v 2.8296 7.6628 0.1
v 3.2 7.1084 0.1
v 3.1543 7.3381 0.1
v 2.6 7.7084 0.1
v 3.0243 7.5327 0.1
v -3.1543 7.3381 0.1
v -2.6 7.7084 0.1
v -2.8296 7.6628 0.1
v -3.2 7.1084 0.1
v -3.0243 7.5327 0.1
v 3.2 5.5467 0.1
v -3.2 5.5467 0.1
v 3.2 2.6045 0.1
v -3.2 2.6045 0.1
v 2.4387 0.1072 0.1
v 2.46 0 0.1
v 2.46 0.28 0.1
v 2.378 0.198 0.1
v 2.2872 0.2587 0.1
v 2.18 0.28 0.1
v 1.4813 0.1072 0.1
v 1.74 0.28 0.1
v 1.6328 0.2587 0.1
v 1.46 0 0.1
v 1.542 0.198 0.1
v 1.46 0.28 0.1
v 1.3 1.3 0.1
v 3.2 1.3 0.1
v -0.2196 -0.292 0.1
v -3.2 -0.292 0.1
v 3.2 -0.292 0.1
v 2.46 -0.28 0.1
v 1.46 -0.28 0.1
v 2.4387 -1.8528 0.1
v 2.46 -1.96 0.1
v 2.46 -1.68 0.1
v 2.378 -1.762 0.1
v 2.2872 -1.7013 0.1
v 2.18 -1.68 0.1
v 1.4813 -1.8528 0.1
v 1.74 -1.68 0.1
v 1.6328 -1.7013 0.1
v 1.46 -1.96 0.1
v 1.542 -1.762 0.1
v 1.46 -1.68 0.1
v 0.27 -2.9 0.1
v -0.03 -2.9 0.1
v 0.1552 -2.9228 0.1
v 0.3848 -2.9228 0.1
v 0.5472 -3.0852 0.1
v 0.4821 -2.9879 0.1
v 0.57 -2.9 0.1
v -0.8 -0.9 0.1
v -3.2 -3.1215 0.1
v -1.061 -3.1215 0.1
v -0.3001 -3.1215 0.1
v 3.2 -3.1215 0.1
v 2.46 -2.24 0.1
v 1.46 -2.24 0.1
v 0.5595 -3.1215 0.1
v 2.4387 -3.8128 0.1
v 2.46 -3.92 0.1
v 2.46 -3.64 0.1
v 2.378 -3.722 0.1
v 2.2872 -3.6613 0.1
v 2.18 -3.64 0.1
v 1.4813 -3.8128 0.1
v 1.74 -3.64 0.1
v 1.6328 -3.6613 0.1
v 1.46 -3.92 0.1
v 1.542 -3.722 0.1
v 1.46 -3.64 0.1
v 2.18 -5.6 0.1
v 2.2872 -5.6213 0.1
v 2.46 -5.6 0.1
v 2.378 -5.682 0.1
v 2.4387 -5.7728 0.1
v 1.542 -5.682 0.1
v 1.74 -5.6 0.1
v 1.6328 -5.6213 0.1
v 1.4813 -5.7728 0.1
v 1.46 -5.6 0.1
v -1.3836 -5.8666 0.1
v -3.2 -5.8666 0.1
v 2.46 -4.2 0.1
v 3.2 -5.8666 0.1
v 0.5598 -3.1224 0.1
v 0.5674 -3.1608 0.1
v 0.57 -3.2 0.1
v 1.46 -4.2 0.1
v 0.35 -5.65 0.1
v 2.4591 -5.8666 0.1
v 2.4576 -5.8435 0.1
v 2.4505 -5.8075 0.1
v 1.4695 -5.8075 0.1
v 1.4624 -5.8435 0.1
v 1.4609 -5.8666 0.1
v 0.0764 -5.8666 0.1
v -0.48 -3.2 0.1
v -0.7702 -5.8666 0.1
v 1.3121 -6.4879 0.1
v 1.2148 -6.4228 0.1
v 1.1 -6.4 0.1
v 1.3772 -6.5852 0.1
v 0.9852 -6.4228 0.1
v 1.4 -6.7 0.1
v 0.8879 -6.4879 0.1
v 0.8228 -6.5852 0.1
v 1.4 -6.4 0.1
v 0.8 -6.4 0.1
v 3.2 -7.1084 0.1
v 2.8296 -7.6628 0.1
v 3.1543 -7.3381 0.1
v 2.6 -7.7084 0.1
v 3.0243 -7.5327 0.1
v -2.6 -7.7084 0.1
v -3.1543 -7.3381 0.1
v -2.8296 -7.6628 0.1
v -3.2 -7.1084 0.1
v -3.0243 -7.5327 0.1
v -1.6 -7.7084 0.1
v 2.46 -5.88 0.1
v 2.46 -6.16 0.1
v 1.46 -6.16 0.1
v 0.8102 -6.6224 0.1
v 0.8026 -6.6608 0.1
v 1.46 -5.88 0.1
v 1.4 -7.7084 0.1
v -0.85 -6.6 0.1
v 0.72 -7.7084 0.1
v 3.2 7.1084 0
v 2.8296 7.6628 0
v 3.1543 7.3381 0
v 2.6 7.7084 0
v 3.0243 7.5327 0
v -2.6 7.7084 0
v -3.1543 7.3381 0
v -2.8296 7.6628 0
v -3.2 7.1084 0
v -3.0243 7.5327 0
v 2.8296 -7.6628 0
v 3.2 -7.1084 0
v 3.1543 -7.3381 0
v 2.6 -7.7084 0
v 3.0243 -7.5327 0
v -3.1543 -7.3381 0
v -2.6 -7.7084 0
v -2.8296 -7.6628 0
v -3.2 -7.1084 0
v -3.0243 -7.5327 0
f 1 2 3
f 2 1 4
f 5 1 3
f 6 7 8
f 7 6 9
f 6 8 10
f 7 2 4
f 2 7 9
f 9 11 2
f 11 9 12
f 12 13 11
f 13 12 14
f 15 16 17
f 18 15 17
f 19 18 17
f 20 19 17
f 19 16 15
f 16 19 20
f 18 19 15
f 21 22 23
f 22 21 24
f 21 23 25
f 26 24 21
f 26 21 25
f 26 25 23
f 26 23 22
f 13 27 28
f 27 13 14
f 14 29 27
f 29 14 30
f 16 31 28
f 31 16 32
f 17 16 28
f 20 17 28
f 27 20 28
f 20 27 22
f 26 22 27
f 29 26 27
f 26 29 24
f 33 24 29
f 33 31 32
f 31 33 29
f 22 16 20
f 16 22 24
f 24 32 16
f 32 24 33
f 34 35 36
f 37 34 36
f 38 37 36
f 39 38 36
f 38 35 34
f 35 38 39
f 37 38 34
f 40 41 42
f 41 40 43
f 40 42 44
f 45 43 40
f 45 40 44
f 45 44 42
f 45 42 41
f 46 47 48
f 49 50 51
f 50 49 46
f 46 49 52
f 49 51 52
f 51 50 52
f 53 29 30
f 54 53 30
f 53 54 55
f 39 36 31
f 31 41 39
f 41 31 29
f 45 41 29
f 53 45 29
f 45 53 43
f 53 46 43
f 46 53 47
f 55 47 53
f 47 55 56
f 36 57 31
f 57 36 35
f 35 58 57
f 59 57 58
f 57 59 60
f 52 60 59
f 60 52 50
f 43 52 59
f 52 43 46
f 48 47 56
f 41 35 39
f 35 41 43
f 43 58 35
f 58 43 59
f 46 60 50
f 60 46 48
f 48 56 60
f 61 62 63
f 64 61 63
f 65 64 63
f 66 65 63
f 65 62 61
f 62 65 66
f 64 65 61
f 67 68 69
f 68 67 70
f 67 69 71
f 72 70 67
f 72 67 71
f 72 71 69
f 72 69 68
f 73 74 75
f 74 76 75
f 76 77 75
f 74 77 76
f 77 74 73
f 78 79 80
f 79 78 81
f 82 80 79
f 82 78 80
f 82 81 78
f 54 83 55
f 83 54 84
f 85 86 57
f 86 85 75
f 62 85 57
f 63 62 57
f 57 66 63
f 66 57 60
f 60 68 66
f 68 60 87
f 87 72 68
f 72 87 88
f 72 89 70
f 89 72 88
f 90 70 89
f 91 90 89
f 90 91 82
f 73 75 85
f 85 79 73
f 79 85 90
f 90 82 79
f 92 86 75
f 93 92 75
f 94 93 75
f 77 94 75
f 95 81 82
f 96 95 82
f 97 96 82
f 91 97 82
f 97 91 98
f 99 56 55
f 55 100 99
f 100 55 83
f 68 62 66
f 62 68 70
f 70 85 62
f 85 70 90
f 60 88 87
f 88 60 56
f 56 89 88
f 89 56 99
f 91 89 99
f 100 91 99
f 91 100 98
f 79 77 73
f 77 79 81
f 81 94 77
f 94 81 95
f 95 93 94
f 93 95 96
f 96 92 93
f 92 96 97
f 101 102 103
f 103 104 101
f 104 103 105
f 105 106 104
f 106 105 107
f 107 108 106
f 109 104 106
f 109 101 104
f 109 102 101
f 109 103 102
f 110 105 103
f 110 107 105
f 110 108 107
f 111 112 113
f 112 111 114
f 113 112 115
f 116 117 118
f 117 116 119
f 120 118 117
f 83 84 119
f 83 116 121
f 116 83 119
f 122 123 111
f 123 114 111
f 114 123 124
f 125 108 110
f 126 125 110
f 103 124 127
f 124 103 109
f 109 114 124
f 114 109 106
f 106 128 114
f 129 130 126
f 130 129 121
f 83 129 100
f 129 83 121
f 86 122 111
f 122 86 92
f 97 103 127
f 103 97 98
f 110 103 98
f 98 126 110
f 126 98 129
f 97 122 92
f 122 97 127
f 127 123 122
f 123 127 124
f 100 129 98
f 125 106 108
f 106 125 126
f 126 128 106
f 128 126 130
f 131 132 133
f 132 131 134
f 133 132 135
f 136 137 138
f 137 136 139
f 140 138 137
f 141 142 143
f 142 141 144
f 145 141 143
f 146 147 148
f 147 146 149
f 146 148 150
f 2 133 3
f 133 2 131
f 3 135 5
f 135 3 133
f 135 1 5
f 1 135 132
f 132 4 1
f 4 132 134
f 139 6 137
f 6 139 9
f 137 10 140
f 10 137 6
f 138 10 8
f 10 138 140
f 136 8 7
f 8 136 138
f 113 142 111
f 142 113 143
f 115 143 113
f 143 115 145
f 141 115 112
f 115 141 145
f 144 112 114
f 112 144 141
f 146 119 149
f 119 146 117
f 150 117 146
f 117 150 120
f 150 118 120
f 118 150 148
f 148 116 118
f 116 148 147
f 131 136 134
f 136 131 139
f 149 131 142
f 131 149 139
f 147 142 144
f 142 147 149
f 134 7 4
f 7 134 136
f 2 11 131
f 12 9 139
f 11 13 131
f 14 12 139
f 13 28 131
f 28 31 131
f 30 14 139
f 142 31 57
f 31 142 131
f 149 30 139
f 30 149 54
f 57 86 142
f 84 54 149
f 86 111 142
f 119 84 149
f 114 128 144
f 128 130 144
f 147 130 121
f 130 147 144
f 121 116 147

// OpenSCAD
// file: ../p/empty.scad
use <../lib.scad>
function ldraw_lib__empty() = [
// 0 Empty
// 0 Name: empty.dat
// 0 Author: Steffen [Steffen]
// 0 !LDRAW_ORG Primitive UPDATE 2015-01
// 0 !LICENSE Licensed under CC BY 2.0 and CC BY 4.0 : see CAreadme.txt
// 
// 0 BFC CERTIFY CCW
  [0,"BFC","CERTIFY"],
  [0,"BFC","CCW"],
// 
// 0 !HISTORY 2015-10-11 [PTadmin] Official Update 2015-01
// 
// 
// 0 // Tool MLCad cannot handle really empty files. This file is used as a workaround.
// 0 // It exceptionally contains forbidden non-LDRAW standard syntax to satisfy MLCad until it is fixed OR a different editor has become the de-facto LDRAW standard.
// 0 // The line being used here is an "impossible" conditional line which never should be visible,
// 0 // additionally hidden by a syntax explicitly hiding it from displaying.
// 
// 0 MLCAD HIDE 5 24 0 0 0 0.0001 0 0 0.0001 -0.0001 0 0 0 0
];
makepoly(ldraw_lib__empty(), line=0.2);
// file: ../p/1-4cyli.scad
use <../lib.scad>
function ldraw_lib__1_4cyli() = [
// 0 Cylinder 0.25
// 0 Name: 1-4cyli.dat
// 0 Author: James Jessiman
// 0 !LDRAW_ORG Primitive UPDATE 2012-01
// 0 !LICENSE Licensed under CC BY 2.0 and CC BY 4.0 : see CAreadme.txt
// 
// 0 BFC CERTIFY CCW
  [0,"BFC","CERTIFY"],
  [0,"BFC","CCW"],
// 
// 0 !HISTORY 2002-03-23 [sbliss] Added BFC statement.
// 0 !HISTORY 2002-04-25 [PTadmin] Official Update 2002-02
// 0 !HISTORY 2007-06-22 [PTadmin] Header formatted for Contributor Agreement
// 0 !HISTORY 2008-07-01 [PTadmin] Official Update 2008-01
// 0 !HISTORY 2012-02-16 [Philo] Changed to CCW
// 0 !HISTORY 2012-03-30 [PTadmin] Official Update 2012-01
// 
// 
// 4 16 1 1 0 0.9239 1 0.3827 0.9239 0 0.3827 1 0 0
  [4,16,1,1,0,0.9239,1,0.3827,0.9239,0,0.3827,1,0,0],
// 5 24 1 0 0 1 1 0 0.9239 0 0.3827 1 0 -1
  [5,24,1,0,0,1,1,0,0.9239,0,0.3827,1,0,-1],
// 4 16 0.9239 1 0.3827 0.7071 1 0.7071 0.7071 0 0.7071 0.9239 0 0.3827
  [4,16,0.9239,1,0.3827,0.7071,1,0.7071,0.7071,0,0.7071,0.9239,0,0.3827],
// 5 24 0.9239 0 0.3827 0.9239 1 0.3827 0.7071 0 0.7071 1 0 0
  [5,24,0.9239,0,0.3827,0.9239,1,0.3827,0.7071,0,0.7071,1,0,0],
// 4 16 0.7071 1 0.7071 0.3827 1 0.9239 0.3827 0 0.9239 0.7071 0 0.7071
  [4,16,0.7071,1,0.7071,0.3827,1,0.9239,0.3827,0,0.9239,0.7071,0,0.7071],
// 5 24 0.7071 0 0.7071 0.7071 1 0.7071 0.3827 0 0.9239 0.9239 0 0.3827
  [5,24,0.7071,0,0.7071,0.7071,1,0.7071,0.3827,0,0.9239,0.9239,0,0.3827],
// 4 16 0.3827 1 0.9239 0 1 1 0 0 1 0.3827 0 0.9239
  [4,16,0.3827,1,0.9239,0,1,1,0,0,1,0.3827,0,0.9239],
// 5 24 0.3827 0 0.9239 0.3827 1 0.9239 0 0 1 0.7071 0 0.7071
  [5,24,0.3827,0,0.9239,0.3827,1,0.9239,0,0,1,0.7071,0,0.7071],
// 5 24 0 0 1 0 1 1 0.3827 0 0.9239 -1 0 1
  [5,24,0,0,1,0,1,1,0.3827,0,0.9239,-1,0,1],
];
makepoly(ldraw_lib__1_4cyli(), line=0.2);
// file: ../p/7-16ndis.scad
use <../lib.scad>
function ldraw_lib__7_16ndis() = [
// 0 Disc Negative 0.4375
// 0 Name: 7-16ndis.dat
// 0 Author: Alex Taylor [anathema]
// 0 !LDRAW_ORG Primitive UPDATE 2010-01
// 0 !LICENSE Licensed under CC BY 2.0 and CC BY 4.0 : see CAreadme.txt
// 
// 0 BFC CERTIFY CCW
  [0,"BFC","CERTIFY"],
  [0,"BFC","CCW"],
// 
// 0 !HISTORY 2010-04-05 [PTadmin] Official Update 2010-01
// 
// 
// 3 16 1 0 1 0.9239 0 0.3827 1 0 0
  [3,16,1,0,1,0.9239,0,0.3827,1,0,0],
// 3 16 1 0 1 0.7071 0 0.7071 0.9239 0 0.3827
  [3,16,1,0,1,0.7071,0,0.7071,0.9239,0,0.3827],
// 3 16 1 0 1 0.3827 0 0.9239 0.7071 0 0.7071
  [3,16,1,0,1,0.3827,0,0.9239,0.7071,0,0.7071],
// 3 16 1 0 1 0 0 1 0.3827 0 0.9239
  [3,16,1,0,1,0,0,1,0.3827,0,0.9239],
// 3 16 -1 0 1 -0.3827 0 0.9239 0 0 1
  [3,16,-1,0,1,-0.3827,0,0.9239,0,0,1],
// 3 16 -1 0 1 -0.7071 0 0.7071 -0.3827 0 0.9239
  [3,16,-1,0,1,-0.7071,0,0.7071,-0.3827,0,0.9239],
// 3 16 -1 0 1 -0.9239 0 0.3827 -0.7071 0 0.7071
  [3,16,-1,0,1,-0.9239,0,0.3827,-0.7071,0,0.7071],
// 0
];
makepoly(ldraw_lib__7_16ndis(), line=0.2);
// file: ../p/7-16chrd.scad
use <../lib.scad>
function ldraw_lib__7_16chrd() = [
// 0 Chord 0.4375
// 0 Name: 7-16chrd.dat
// 0 Author: Guy Vivan [guyvivan]
// 0 !LDRAW_ORG Primitive UPDATE 2009-03
// 0 !LICENSE Licensed under CC BY 2.0 and CC BY 4.0 : see CAreadme.txt
// 
// 0 BFC CERTIFY CCW
  [0,"BFC","CERTIFY"],
  [0,"BFC","CCW"],
// 
// 0 !HISTORY 2009-12-29 [PTadmin] Official Update 2009-03
// 
// 
// 3 16 0.7071 0 0.7071 0.3827 0 0.9239 0 0 1
  [3,16,0.7071,0,0.7071,0.3827,0,0.9239,0,0,1],
// 4 16 0.7071 0 0.7071 0 0 1 -0.3827 0 0.9239 0.9239 0 0.3827
  [4,16,0.7071,0,0.7071,0,0,1,-0.3827,0,0.9239,0.9239,0,0.3827],
// 4 16 0.9239 0 0.3827 -0.3827 0 0.9239 -0.7071 0 0.7071 1 0 0
  [4,16,0.9239,0,0.3827,-0.3827,0,0.9239,-0.7071,0,0.7071,1,0,0],
// 3 16 -0.7071 0 0.7071 -0.9239 0 0.3827 1 0 0
  [3,16,-0.7071,0,0.7071,-0.9239,0,0.3827,1,0,0],
// 0
];
makepoly(ldraw_lib__7_16chrd(), line=0.2);
// file: ../p/3-16ndis.scad
use <../lib.scad>
function ldraw_lib__3_16ndis() = [
// 0 Disc Negative 0.1875
// 0 Name: 3-16ndis.dat
// 0 Author: Guy Vivan [guyvivan]
// 0 !LDRAW_ORG Primitive UPDATE 2009-01
// 0 !LICENSE Licensed under CC BY 2.0 and CC BY 4.0 : see CAreadme.txt
// 
// 0 BFC CERTIFY CCW
  [0,"BFC","CERTIFY"],
  [0,"BFC","CCW"],
// 
// 0 !HISTORY 2009-05-02 [PTadmin] Official Update 2009-01
// 
// 
// 3 16 1 0 1 0.9239 0 0.3827 1 0 0
  [3,16,1,0,1,0.9239,0,0.3827,1,0,0],
// 3 16 1 0 1 0.7071 0 0.7071 0.9239 0 0.3827
  [3,16,1,0,1,0.7071,0,0.7071,0.9239,0,0.3827],
// 3 16 1 0 1 0.3827 0 0.9239 0.7071 0 0.7071
  [3,16,1,0,1,0.3827,0,0.9239,0.7071,0,0.7071],
// 
// 0 end of file
// 
];
makepoly(ldraw_lib__3_16ndis(), line=0.2);
// file: ../p/3-16chrd.scad
use <../lib.scad>
function ldraw_lib__3_16chrd() = [
// 0 Chord 0.1875
// 0 Name: 3-16chrd.dat
// 0 Author: Niels Karsdorp [nielsk]
// 0 !LDRAW_ORG Primitive UPDATE 2009-01
// 0 !LICENSE Licensed under CC BY 2.0 and CC BY 4.0 : see CAreadme.txt
// 
// 0 BFC CERTIFY CCW
  [0,"BFC","CERTIFY"],
  [0,"BFC","CCW"],
// 
// 0 !HISTORY 2009-05-02 [PTadmin] Official Update 2009-01
// 
// 
// 4 16 1 0 0 0.9239 0 0.3827 0.7071 0 0.7071 0.3827 0 0.9239
  [4,16,1,0,0,0.9239,0,0.3827,0.7071,0,0.7071,0.3827,0,0.9239],
// 0
// 
];
makepoly(ldraw_lib__3_16chrd(), line=0.2);
// file: ../p/1-16ndis.scad
use <../lib.scad>
function ldraw_lib__1_16ndis() = [
// 0 Disc Negative 0.0625
// 0 Name: 1-16ndis.dat
// 0 Author: Niels Karsdorp [nielsk]
// 0 !LDRAW_ORG Primitive UPDATE 2009-01
// 0 !LICENSE Licensed under CC BY 2.0 and CC BY 4.0 : see CAreadme.txt
// 
// 0 BFC CERTIFY CCW
  [0,"BFC","CERTIFY"],
  [0,"BFC","CCW"],
// 
// 0 !HISTORY 2009-05-02 [PTadmin] Official Update 2009-01
// 
// 
// 3 16 1 0 0 1 0 1 0.9239 0 0.3827
  [3,16,1,0,0,1,0,1,0.9239,0,0.3827],
// 0
];
makepoly(ldraw_lib__1_16ndis(), line=0.2);
// file: ../p/1-16chrd.scad
use <../lib.scad>
use <empty.scad>
function ldraw_lib__1_16chrd() = [
// 0 Chord 0.0625
// 0 Name: 1-16chrd.dat
// 0 Author: Philippe Hurbain [Philo]
// 0 !LDRAW_ORG Primitive UPDATE 2015-01
// 0 !LICENSE Licensed under CC BY 2.0 and CC BY 4.0 : see CAreadme.txt
// 
// 0 BFC CERTIFY CCW
  [0,"BFC","CERTIFY"],
  [0,"BFC","CCW"],
// 
// 0 !HISTORY 2015-10-11 [PTadmin] Official Update 2015-01
// 
// 
// 0 // This file is intentionally empty because at the current \P resolution,
// 0 // an 1-16chrd is actually empty. However, this file still is present
// 0 // to allow tools to do primitives substition and fill in a real chrd here,
// 0 // or, if desired, to substitute this with the hi-res 48\1-16chrd.
// 
// 0 // This file is based on an idea by Darats at http://forums.ldraw.org/read.php?19,14500,14500#msg-14500
// 
// 1 16 0 0 0 1 0 0 0 1 0 0 0 1 empty.dat
  [1,16,0,0,0,1,0,0,0,1,0,0,0,1, ldraw_lib__empty()],
];
makepoly(ldraw_lib__1_16chrd(), line=0.2);
// file: ../p/1-4ndis.scad
use <../lib.scad>
function ldraw_lib__1_4ndis() = [
// 0 Disc Negative 0.25
// 0 Name: 1-4ndis.dat
// 0 Author: James Jessiman
// 0 !LDRAW_ORG Primitive UPDATE 2012-01
// 0 !LICENSE Licensed under CC BY 2.0 and CC BY 4.0 : see CAreadme.txt
// 
// 0 BFC CERTIFY CCW
  [0,"BFC","CERTIFY"],
  [0,"BFC","CCW"],
// 
// 0 !HISTORY 2002-03-23 [sbliss] Added BFC Statement
// 0 !HISTORY 2002-04-25 [PTadmin] Official Update 2002-02
// 0 !HISTORY 2007-06-22 [PTadmin] Header formatted for Contributor Agreement
// 0 !HISTORY 2008-07-01 [PTadmin] Official Update 2008-01
// 0 !HISTORY 2012-02-16 [Philo] Changed to CCW
// 0 !HISTORY 2012-03-30 [PTadmin] Official Update 2012-01
// 
// 
// 3 16 0.9239 0 0.3827 1 0 0 1 0 1
  [3,16,0.9239,0,0.3827,1,0,0,1,0,1],
// 3 16 0.7071 0 0.7071 0.9239 0 0.3827 1 0 1
  [3,16,0.7071,0,0.7071,0.9239,0,0.3827,1,0,1],
// 3 16 0.3827 0 0.9239 0.7071 0 0.7071 1 0 1
  [3,16,0.3827,0,0.9239,0.7071,0,0.7071,1,0,1],
// 3 16 0 0 1 0.3827 0 0.9239 1 0 1
  [3,16,0,0,1,0.3827,0,0.9239,1,0,1],
];
makepoly(ldraw_lib__1_4ndis(), line=0.2);
// file: ../p/1-4chrd.scad
use <../lib.scad>
function ldraw_lib__1_4chrd() = [
// 0 Chord 0.25
// 0 Name: 1-4chrd.dat
// 0 Author: Tony Hafner [hafhead]
// 0 !LDRAW_ORG Primitive UPDATE 2012-02
// 0 !LICENSE Licensed under CC BY 2.0 and CC BY 4.0 : see CAreadme.txt
// 
// 0 BFC CERTIFY CCW
  [0,"BFC","CERTIFY"],
  [0,"BFC","CCW"],
// 
// 0 !HISTORY 2004-04-22 [PTadmin] Official Update 2004-02
// 0 !HISTORY 2007-10-09 [PTadmin] Header formatted for Contributor Agreement
// 0 !HISTORY 2008-07-01 [PTadmin] Official Update 2008-01
// 0 !HISTORY 2012-08-02 [MMR1988] Re-creation with PrimGen2 and Rectifier
// 0 !HISTORY 2012-08-09 [PTadmin] Official Update 2012-02
// 
// 
// 4 16 0.9239 0 0.3827 0.3827 0 0.9239 0 0 1 1 0 0
  [4,16,0.9239,0,0.3827,0.3827,0,0.9239,0,0,1,1,0,0],
// 3 16 0.7071 0 0.7071 0.3827 0 0.9239 0.9239 0 0.3827
  [3,16,0.7071,0,0.7071,0.3827,0,0.9239,0.9239,0,0.3827],
];
makepoly(ldraw_lib__1_4chrd(), line=0.2);
// file: s/6142622ms06.scad
use <../../lib.scad>
use <../../p/1-4chrd.scad>
use <../../p/1-4cyli.scad>
function ldraw_lib__s__6142622ms06() = [
// 0 ~Sticker  1.9 x  0.8 with Black Headlamp on Yellow Background Right - Underside Flat
// 0 Name: s\6142622ms06.dat
// 0 Author: Massimo Maso [Sirio]
// 0 !LDRAW_ORG Subpart UPDATE 2022-03
// 0 !LICENSE Licensed under CC BY 2.0 and CC BY 4.0 : see CAreadme.txt
// 
// 0 BFC CERTIFY CCW
  [0,"BFC","CERTIFY"],
  [0,"BFC","CCW"],
// 
// 0 !HISTORY 2022-05-07 [PTadmin] Official Update 2022-03
// 
// 
// 0 // Primitives
// 
// 1 16 -6.5 0 17.7711 -1.5 0 0 0 -1 0 0 0 1.5 1-4chrd.dat
  [1,16,-6.5,0,17.7711,-1.5,0,0,0,-1,0,0,0,1.5, ldraw_lib__1_4chrd()],
// 1 16 6.5 0 17.7711 1.5 0 0 0 -1 0 0 0 1.5 1-4chrd.dat
  [1,16,6.5,0,17.7711,1.5,0,0,0,-1,0,0,0,1.5, ldraw_lib__1_4chrd()],
// 1 16 -6.5 0 -17.7711 -1.5 0 0 0 -1 0 0 0 -1.5 1-4chrd.dat
  [1,16,-6.5,0,-17.7711,-1.5,0,0,0,-1,0,0,0,-1.5, ldraw_lib__1_4chrd()],
// 1 16 6.5 0 -17.7711 1.5 0 0 0 -1 0 0 0 -1.5 1-4chrd.dat
  [1,16,6.5,0,-17.7711,1.5,0,0,0,-1,0,0,0,-1.5, ldraw_lib__1_4chrd()],
// 1 16 -6.5 -0.25 17.7711 -1.5 0 0 0 0.25 0 0 0 1.5 1-4cyli.dat
  [1,16,-6.5,-0.25,17.7711,-1.5,0,0,0,0.25,0,0,0,1.5, ldraw_lib__1_4cyli()],
// 1 16 6.5 -0.25 17.7711 1.5 0 0 0 0.25 0 0 0 1.5 1-4cyli.dat
  [1,16,6.5,-0.25,17.7711,1.5,0,0,0,0.25,0,0,0,1.5, ldraw_lib__1_4cyli()],
// 1 16 -6.5 -0.25 -17.7711 -1.5 0 0 0 0.25 0 0 0 -1.5 1-4cyli.dat
  [1,16,-6.5,-0.25,-17.7711,-1.5,0,0,0,0.25,0,0,0,-1.5, ldraw_lib__1_4cyli()],
// 1 16 6.5 -0.25 -17.7711 1.5 0 0 0 0.25 0 0 0 -1.5 1-4cyli.dat
  [1,16,6.5,-0.25,-17.7711,1.5,0,0,0,0.25,0,0,0,-1.5, ldraw_lib__1_4cyli()],
// 0 // Bottom face
// 4 16 6.5 0 19.2711 8 0 17.7711 -8 0 17.7711 -6.5 0 19.2711
  [4,16,6.5,0,19.2711,8,0,17.7711,-8,0,17.7711,-6.5,0,19.2711],
// 4 16 8 0 17.7711 8 0 -17.7711 -8 0 -17.7711 -8 0 17.7711
  [4,16,8,0,17.7711,8,0,-17.7711,-8,0,-17.7711,-8,0,17.7711],
// 4 16 8 0 -17.7711 6.5 0 -19.2711 -6.5 0 -19.2711 -8 0 -17.7711
  [4,16,8,0,-17.7711,6.5,0,-19.2711,-6.5,0,-19.2711,-8,0,-17.7711],
// 0 // Lateral face
// 4 16 -6.5 0 19.2711 -6.5 -.25 19.2711 6.5 -.25 19.2711 6.5 0 19.2711
  [4,16,-6.5,0,19.2711,-6.5,-.25,19.2711,6.5,-.25,19.2711,6.5,0,19.2711],
// 3 16 -8 0 17.7711 -8 -.25 13.8668 -8 -.25 17.7711
  [3,16,-8,0,17.7711,-8,-.25,13.8668,-8,-.25,17.7711],
// 3 16 8 0 17.7711 8 -.25 17.7711 8 -.25 13.8668
  [3,16,8,0,17.7711,8,-.25,17.7711,8,-.25,13.8668],
// 3 16 -8 0 17.7711 -8 -.25 6.5112 -8 -.25 13.8668
  [3,16,-8,0,17.7711,-8,-.25,6.5112,-8,-.25,13.8668],
// 3 16 8 0 17.7711 8 -.25 13.8668 8 -.25 6.5112
  [3,16,8,0,17.7711,8,-.25,13.8668,8,-.25,6.5112],
// 3 16 -8 0 17.7711 -8 -.25 3.25 -8 -.25 6.5112
  [3,16,-8,0,17.7711,-8,-.25,3.25,-8,-.25,6.5112],
// 3 16 -8 0 17.7711 -8 -.25 -.73 -8 -.25 3.25
  [3,16,-8,0,17.7711,-8,-.25,-.73,-8,-.25,3.25],
// 3 16 8 0 17.7711 8 -.25 6.5112 8 -.25 -.73
  [3,16,8,0,17.7711,8,-.25,6.5112,8,-.25,-.73],
// 4 16 -8 0 17.7711 -8 0 -17.7711 -8 -.25 -7.8038 -8 -.25 -.73
  [4,16,-8,0,17.7711,-8,0,-17.7711,-8,-.25,-7.8038,-8,-.25,-.73],
// 4 16 8 0 17.7711 8 -.25 -.73 8 -.25 -7.8038 8 0 -17.7711
  [4,16,8,0,17.7711,8,-.25,-.73,8,-.25,-7.8038,8,0,-17.7711],
// 3 16 -8 0 -17.7711 -8 -.25 -14.6666 -8 -.25 -7.8038
  [3,16,-8,0,-17.7711,-8,-.25,-14.6666,-8,-.25,-7.8038],
// 3 16 8 0 -17.7711 8 -.25 -7.8038 8 -.25 -14.6666
  [3,16,8,0,-17.7711,8,-.25,-7.8038,8,-.25,-14.6666],
// 3 16 -8 0 -17.7711 -8 -.25 -17.7711 -8 -.25 -14.6666
  [3,16,-8,0,-17.7711,-8,-.25,-17.7711,-8,-.25,-14.6666],
// 3 16 8 0 -17.7711 8 -.25 -14.6666 8 -.25 -17.7711
  [3,16,8,0,-17.7711,8,-.25,-14.6666,8,-.25,-17.7711],
// 3 16 -6.5 0 -19.2711 -3.5 -.25 -19.2711 -6.5 -.25 -19.2711
  [3,16,-6.5,0,-19.2711,-3.5,-.25,-19.2711,-6.5,-.25,-19.2711],
// 3 16 -6.5 0 -19.2711 -1.8 -.25 -19.2711 -3.5 -.25 -19.2711
  [3,16,-6.5,0,-19.2711,-1.8,-.25,-19.2711,-3.5,-.25,-19.2711],
// 4 16 -6.5 0 -19.2711 6.5 0 -19.2711 4 -.25 -19.2711 -1.8 -.25 -19.2711
  [4,16,-6.5,0,-19.2711,6.5,0,-19.2711,4,-.25,-19.2711,-1.8,-.25,-19.2711],
// 3 16 6.5 0 -19.2711 6.5 -.25 -19.2711 4 -.25 -19.2711
  [3,16,6.5,0,-19.2711,6.5,-.25,-19.2711,4,-.25,-19.2711],
];
makepoly(ldraw_lib__s__6142622ms06(), line=0.2);
// file: s/6142622ms05.scad
use <../../lib.scad>
use <../../p/1-4chrd.scad>
use <../../p/7-16chrd.scad>
use <../../p/7-16ndis.scad>
function ldraw_lib__s__6142622ms05() = [
// 0 ~Sticker  1.9 x  0.8 with Black Headlamp on Yellow Background Right - Upper Section 6
// 0 Name: s\6142622ms05.dat
// 0 Author: Massimo Maso [Sirio]
// 0 !LDRAW_ORG Subpart UPDATE 2022-03
// 0 !LICENSE Licensed under CC BY 2.0 and CC BY 4.0 : see CAreadme.txt
// 
// 0 BFC CERTIFY CCW
  [0,"BFC","CERTIFY"],
  [0,"BFC","CCW"],
// 
// 0 !HISTORY 2022-05-07 [PTadmin] Official Update 2022-03
// 
// 
// 0 // Primitives
// 
// 1 15 -2.75 -.25 -2.069 -.75 0 0 0 1 0 0 0 .75 7-16chrd.dat
  [1,15,-2.75,-.25,-2.069,-.75,0,0,0,1,0,0,0,.75, ldraw_lib__7_16chrd()],
// 1 0 -2.75 -.25 -2.069 -.75 0 0 0 1 0 0 0 .75 7-16ndis.dat
  [1,0,-2.75,-.25,-2.069,-.75,0,0,0,1,0,0,0,.75, ldraw_lib__7_16ndis()],
// 1 0 -6.5 -.25 -3.0901 -1.5 0 0 0 1 0 0 0 -1.5 1-4chrd.dat
  [1,0,-6.5,-.25,-3.0901,-1.5,0,0,0,1,0,0,0,-1.5, ldraw_lib__1_4chrd()],
// 1 14 6.5 -.25 -3.0901 1.5 0 0 0 1 0 0 0 -1.5 1-4chrd.dat
  [1,14,6.5,-.25,-3.0901,1.5,0,0,0,1,0,0,0,-1.5, ldraw_lib__1_4chrd()],
// 0 // Yellow faces
// 3 14 8 -.25 -3.0901 8 -.25 .0144 3.459 -.25 .0144
  [3,14,8,-.25,-3.0901,8,-.25,.0144,3.459,-.25,.0144],
// 4 14 8 -.25 -3.0901 3.459 -.25 .0144 4 -.25 -4.5901 6.5 -.25 -4.5901
  [4,14,8,-.25,-3.0901,3.459,-.25,.0144,4,-.25,-4.5901,6.5,-.25,-4.5901],
// 0 // Black faces
// 3 0 -8 -.25 -3.0901 -6.15 -.25 -.719 -6.15 -.25 -.019
  [3,0,-8,-.25,-3.0901,-6.15,-.25,-.719,-6.15,-.25,-.019],
// 4 0 -8 -.25 -3.0901 -6.5 -.25 -4.5901 -3.65 -.25 -.719 -6.15 -.25 -.719
  [4,0,-8,-.25,-3.0901,-6.5,-.25,-4.5901,-3.65,-.25,-.719,-6.15,-.25,-.719],
// 3 0 -2 -.25 -1.319 -2.057075 -.25 -1.781975 -2.0256 -.25 -1.8749
  [3,0,-2,-.25,-1.319,-2.057075,-.25,-1.781975,-2.0256,-.25,-1.8749],
// 3 0 -2 -.25 -1.319 -2.0256 -.25 -1.8749 -2.0064 -.25 -1.9711
  [3,0,-2,-.25,-1.319,-2.0256,-.25,-1.8749,-2.0064,-.25,-1.9711],
// 4 0 -3.65 -.25 -.019 -3.65 -.25 -.719 -3.5 -.25 -1.319 -2.75 -.25 -1.319
  [4,0,-3.65,-.25,-.019,-3.65,-.25,-.719,-3.5,-.25,-1.319,-2.75,-.25,-1.319],
// 4 0 -3.65 -.25 -.719 -6.5 -.25 -4.5901 -3.5 -.25 -2.069 -3.5 -.25 -1.319
  [4,0,-3.65,-.25,-.719,-6.5,-.25,-4.5901,-3.5,-.25,-2.069,-3.5,-.25,-1.319],
// 3 0 -6.5 -.25 -4.5901 -3.5 -.25 -4.5901 -3.5 -.25 -2.069
  [3,0,-6.5,-.25,-4.5901,-3.5,-.25,-4.5901,-3.5,-.25,-2.069],
// 4 0 4 -.25 -4.5901 2.125 -.25 -1.819 -2.0064 -.25 -1.9711 -1.8 -.25 -4.5901
  [4,0,4,-.25,-4.5901,2.125,-.25,-1.819,-2.0064,-.25,-1.9711,-1.8,-.25,-4.5901],
// 4 0 4 -.25 -4.5901 3.459 -.25 .0144 1.9255 -.25 .0144 2.125 -.25 -1.819
  [4,0,4,-.25,-4.5901,3.459,-.25,.0144,1.9255,-.25,.0144,2.125,-.25,-1.819],
// 4 0 -8 -.25 -3.0901 -6.15 -.25 -.019 -6.1478 -.25 .0144 -8 -.25 .0144
  [4,0,-8,-.25,-3.0901,-6.15,-.25,-.019,-6.1478,-.25,.0144,-8,-.25,.0144],
// 4 0 -.1909 -.25 .0144 -3.6522 -.25 .0144 -3.65 -.25 -.019 -2.75 -.25 -1.319
  [4,0,-.1909,-.25,.0144,-3.6522,-.25,.0144,-3.65,-.25,-.019,-2.75,-.25,-1.319],
// 3 0 -.1909 -.25 .0144 -2.75 -.25 -1.319 -2 -.25 -1.319
  [3,0,-.1909,-.25,.0144,-2.75,-.25,-1.319,-2,-.25,-1.319],
// 4 0 2.125 -.25 -1.819 -.1909 -.25 .0144 -2 -.25 -1.319 -2.0064 -.25 -1.9711
  [4,0,2.125,-.25,-1.819,-.1909,-.25,.0144,-2,-.25,-1.319,-2.0064,-.25,-1.9711],
// 0 // Light grey faces
// 4 7 -3.6522 -.25 .0144 -6.1478 -.25 .0144 -6.15 -.25 -.019 -3.65 -.25 -.019
  [4,7,-3.6522,-.25,.0144,-6.1478,-.25,.0144,-6.15,-.25,-.019,-3.65,-.25,-.019],
// 4 7 -6.15 -.25 -.019 -6.15 -.25 -.719 -3.65 -.25 -.719 -3.65 -.25 -.019
  [4,7,-6.15,-.25,-.019,-6.15,-.25,-.719,-3.65,-.25,-.719,-3.65,-.25,-.019],
// 3 7 -.1909 -.25 .0144 2.125 -.25 -1.819 1.9255 -.25 .0144
  [3,7,-.1909,-.25,.0144,2.125,-.25,-1.819,1.9255,-.25,.0144],
// 0 // White faces
// 4 15 -3.5 -.25 -2.069 -2.0064 -.25 -1.9711 -2.0256 -.25 -1.8749 -2.057075 -.25 -1.781975
  [4,15,-3.5,-.25,-2.069,-2.0064,-.25,-1.9711,-2.0256,-.25,-1.8749,-2.057075,-.25,-1.781975],
// 4 15 -3.5 -.25 -2.069 -3.5 -.25 -4.5901 -1.8 -.25 -4.5901 -2.0064 -.25 -1.9711
  [4,15,-3.5,-.25,-2.069,-3.5,-.25,-4.5901,-1.8,-.25,-4.5901,-2.0064,-.25,-1.9711],
];
makepoly(ldraw_lib__s__6142622ms05(), line=0.2);
// file: s/6142622ms04.scad
use <../../lib.scad>
use <../../p/1-4chrd.scad>
use <../../p/1-4ndis.scad>
use <../../p/3-16chrd.scad>
use <../../p/3-16ndis.scad>
function ldraw_lib__s__6142622ms04() = [
// 0 ~Sticker  1.9 x  0.8 with Black Headlamp on Yellow Background Right - Upper Section 5
// 0 Name: s\6142622ms04.dat
// 0 Author: Massimo Maso [Sirio]
// 0 !LDRAW_ORG Subpart UPDATE 2022-03
// 0 !LICENSE Licensed under CC BY 2.0 and CC BY 4.0 : see CAreadme.txt
// 
// 0 BFC CERTIFY CCW
  [0,"BFC","CERTIFY"],
  [0,"BFC","CCW"],
// 
// 0 !HISTORY 2022-05-07 [PTadmin] Official Update 2022-03
// 
// 
// 0 // Primitives
// 
// 1 0 -5.45 -.25 4.8522 -.7 0 0 0 1 0 0 0 .7 1-4ndis.dat
  [1,0,-5.45,-.25,4.8522,-.7,0,0,0,1,0,0,0,.7, ldraw_lib__1_4ndis()],
// 1 7 -5.45 -.25 4.8522 -.7 0 0 0 1 0 0 0 .7 1-4chrd.dat
  [1,7,-5.45,-.25,4.8522,-.7,0,0,0,1,0,0,0,.7, ldraw_lib__1_4chrd()],
// 1 7 -4.35 -.25 4.8522 .7 0 0 0 1 0 0 0 .7 1-4chrd.dat
  [1,7,-4.35,-.25,4.8522,.7,0,0,0,1,0,0,0,.7, ldraw_lib__1_4chrd()],
// 1 0 -4.35 -.25 4.8522 .7 0 0 0 1 0 0 0 .7 1-4ndis.dat
  [1,0,-4.35,-.25,4.8522,.7,0,0,0,1,0,0,0,.7, ldraw_lib__1_4ndis()],
// 1 0 -5.45 -.25 -.0478 0 0 -.7 0 1 0 .7 0 0 3-16ndis.dat
  [1,0,-5.45,-.25,-.0478,0,0,-.7,0,1,0,.7,0,0, ldraw_lib__3_16ndis()],
// 1 7 -5.45 -.25 -.0478 0 0 -.7 0 1 0 .7 0 0 3-16chrd.dat
  [1,7,-5.45,-.25,-.0478,0,0,-.7,0,1,0,.7,0,0, ldraw_lib__3_16chrd()],
// 1 7 -4.35 -.25 -.0478 0 0 .7 0 1 0 .7 0 0 3-16chrd.dat
  [1,7,-4.35,-.25,-.0478,0,0,.7,0,1,0,.7,0,0, ldraw_lib__3_16chrd()],
// 1 0 -4.35 -.25 -.0478 0 0 .7 0 1 0 .7 0 0 3-16ndis.dat
  [1,0,-4.35,-.25,-.0478,0,0,.7,0,1,0,.7,0,0, ldraw_lib__3_16ndis()],
// 0 // Yellow faces
// 4 14 8 -.25 6.8484 2.6526 -.25 6.8484 3.459 -.25 -.0144 8 -.25 -.0144
  [4,14,8,-.25,6.8484,2.6526,-.25,6.8484,3.459,-.25,-.0144,8,-.25,-.0144],
// 0 // Black faces
// 4 0 -8 -.25 6.8484 -8 -.25 -.0144 -6.15 -.25 .6522 -6.15 -.25 4.1522
  [4,0,-8,-.25,6.8484,-8,-.25,-.0144,-6.15,-.25,.6522,-6.15,-.25,4.1522],
// 3 0 -8 -.25 6.8484 -6.15 -.25 4.1522 -6.15 -.25 4.8522
  [3,0,-8,-.25,6.8484,-6.15,-.25,4.1522,-6.15,-.25,4.8522],
// 3 0 -8 -.25 6.8484 -6.15 -.25 4.8522 -6.15 -.25 5.5522
  [3,0,-8,-.25,6.8484,-6.15,-.25,4.8522,-6.15,-.25,5.5522],
// 4 0 -8 -.25 6.8484 -6.15 -.25 5.5522 -5.45 -.25 5.5522 -1.3987 -.25 6.8484
  [4,0,-8,-.25,6.8484,-6.15,-.25,5.5522,-5.45,-.25,5.5522,-1.3987,-.25,6.8484],
// 4 0 -1.3994 -.25 6.8463 -1.3987 -.25 6.8484 -5.45 -.25 5.5522 -4.35 -.25 5.5522
  [4,0,-1.3994,-.25,6.8463,-1.3987,-.25,6.8484,-5.45,-.25,5.5522,-4.35,-.25,5.5522],
// 4 0 -1.3994 -.25 6.8463 -4.35 -.25 5.5522 -3.65 -.25 5.5522 -1.4186 -.25 6.7501
  [4,0,-1.3994,-.25,6.8463,-4.35,-.25,5.5522,-3.65,-.25,5.5522,-1.4186,-.25,6.7501],
// 4 0 -1.425 -.25 6.6522 -1.4186 -.25 6.7501 -3.65 -.25 5.5522 -3.65 -.25 4.8522
  [4,0,-1.425,-.25,6.6522,-1.4186,-.25,6.7501,-3.65,-.25,5.5522,-3.65,-.25,4.8522],
// 3 0 -1.425 -.25 6.6522 -3.65 -.25 4.8522 -3.65 -.25 4.1522
  [3,0,-1.425,-.25,6.6522,-3.65,-.25,4.8522,-3.65,-.25,4.1522],
// 4 0 -1.425 -.25 6.6522 -3.65 -.25 4.1522 -3.65 -.25 .6522 -.875 -.25 .5272
  [4,0,-1.425,-.25,6.6522,-3.65,-.25,4.1522,-3.65,-.25,.6522,-.875,-.25,.5272],
// 3 0 -6.15 -.25 4.1522 -6.15 -.25 .6522 -5.45 -.25 .6522
  [3,0,-6.15,-.25,4.1522,-6.15,-.25,.6522,-5.45,-.25,.6522],
// 4 0 -6.15 -.25 4.1522 -5.45 -.25 .6522 -4.35 -.25 .6522 -3.65 -.25 4.1522
  [4,0,-6.15,-.25,4.1522,-5.45,-.25,.6522,-4.35,-.25,.6522,-3.65,-.25,4.1522],
// 3 0 -4.35 -.25 .6522 -3.65 -.25 .6522 -3.65 -.25 4.1522
  [3,0,-4.35,-.25,.6522,-3.65,-.25,.6522,-3.65,-.25,4.1522],
// 3 0 -6.15 -.25 .6522 -8 -.25 -.0144 -6.1478 -.25 -.0144
  [3,0,-6.15,-.25,.6522,-8,-.25,-.0144,-6.1478,-.25,-.0144],
// 3 0 -6.15 -.25 .6522 -6.1478 -.25 -.0144 -6.14398 -.25 .04355
  [3,0,-6.15,-.25,.6522,-6.1478,-.25,-.0144,-6.14398,-.25,.04355],
// 3 0 -6.15 -.25 .6522 -6.14398 -.25 .04355 -6.12613 -.25 .13336
  [3,0,-6.15,-.25,.6522,-6.14398,-.25,.04355,-6.12613,-.25,.13336],
// 3 0 -6.15 -.25 .6522 -6.12613 -.25 .13336 -6.09673 -.25 .22009
  [3,0,-6.15,-.25,.6522,-6.12613,-.25,.13336,-6.09673,-.25,.22009],
// 3 0 -3.65 -.25 .6522 -3.70327 -.25 .22009 -3.67387 -.25 .13336
  [3,0,-3.65,-.25,.6522,-3.70327,-.25,.22009,-3.67387,-.25,.13336],
// 3 0 -3.65 -.25 .6522 -3.67387 -.25 .13336 -3.65602 -.25 .04355
  [3,0,-3.65,-.25,.6522,-3.67387,-.25,.13336,-3.65602,-.25,.04355],
// 3 0 -3.65 -.25 .6522 -3.65602 -.25 .04355 -3.6522 -.25 -.0144
  [3,0,-3.65,-.25,.6522,-3.65602,-.25,.04355,-3.6522,-.25,-.0144],
// 4 0 -3.65 -.25 .6522 -3.6522 -.25 -.0144 -.1909 -.25 -.0144 -.875 -.25 .5272
  [4,0,-3.65,-.25,.6522,-3.6522,-.25,-.0144,-.1909,-.25,-.0144,-.875,-.25,.5272],
// 3 0 2.6526 -.25 6.8484 .7503 -.25 6.8484 1.2 -.25 6.6522
  [3,0,2.6526,-.25,6.8484,.7503,-.25,6.8484,1.2,-.25,6.6522],
// 4 0 2.6526 -.25 6.8484 1.2 -.25 6.6522 1.9255 -.25 -.0144 3.459 -.25 -.0144
  [4,0,2.6526,-.25,6.8484,1.2,-.25,6.6522,1.9255,-.25,-.0144,3.459,-.25,-.0144],
// 0 // Light grey faces
// 4 7 -6.15 -.25 4.8522 -3.65 -.25 4.8522 -4.35 -.25 5.5522 -5.45 -.25 5.5522
  [4,7,-6.15,-.25,4.8522,-3.65,-.25,4.8522,-4.35,-.25,5.5522,-5.45,-.25,5.5522],
// 4 7 -6.15 -.25 4.8522 -6.15 -.25 4.1522 -3.65 -.25 4.1522 -3.65 -.25 4.8522
  [4,7,-6.15,-.25,4.8522,-6.15,-.25,4.1522,-3.65,-.25,4.1522,-3.65,-.25,4.8522],
// 4 7 .7503 -.25 6.8484 -1.3987 -.25 6.8484 -1.3994 -.25 6.8463 -1.4186 -.25 6.7501
  [4,7,.7503,-.25,6.8484,-1.3987,-.25,6.8484,-1.3994,-.25,6.8463,-1.4186,-.25,6.7501],
// 4 7 .7503 -.25 6.8484 -1.4186 -.25 6.7501 -1.425 -.25 6.6522 1.2 -.25 6.6522
  [4,7,.7503,-.25,6.8484,-1.4186,-.25,6.7501,-1.425,-.25,6.6522,1.2,-.25,6.6522],
// 3 7 1.2 -.25 6.6522 -1.425 -.25 6.6522 -.875 -.25 .5272
  [3,7,1.2,-.25,6.6522,-1.425,-.25,6.6522,-.875,-.25,.5272],
// 4 7 1.2 -.25 6.6522 -.875 -.25 .5272 -.1909 -.25 -.0144 1.9255 -.25 -.0144
  [4,7,1.2,-.25,6.6522,-.875,-.25,.5272,-.1909,-.25,-.0144,1.9255,-.25,-.0144],
// 4 7 -6.09673 -.25 .22009 -3.70327 -.25 .22009 -4.35 -.25 .6522 -5.45 -.25 .6522
  [4,7,-6.09673,-.25,.22009,-3.70327,-.25,.22009,-4.35,-.25,.6522,-5.45,-.25,.6522],
// 4 7 -6.09673 -.25 .22009 -6.12613 -.25 .13336 -3.67387 -.25 .13336 -3.70327 -.25 .22009
  [4,7,-6.09673,-.25,.22009,-6.12613,-.25,.13336,-3.67387,-.25,.13336,-3.70327,-.25,.22009],
// 4 7 -6.14398 -.25 .04355 -3.65602 -.25 .04355 -3.67387 -.25 .13336 -6.12613 -.25 .13336
  [4,7,-6.14398,-.25,.04355,-3.65602,-.25,.04355,-3.67387,-.25,.13336,-6.12613,-.25,.13336],
// 4 7 -6.14398 -.25 .04355 -6.1478 -.25 -.0144 -3.6522 -.25 -.0144 -3.65602 -.25 .04355
  [4,7,-6.14398,-.25,.04355,-6.1478,-.25,-.0144,-3.6522,-.25,-.0144,-3.65602,-.25,.04355],
];
makepoly(ldraw_lib__s__6142622ms04(), line=0.2);
// file: s/6142622ms03.scad
use <../../lib.scad>
use <../../p/1-16chrd.scad>
use <../../p/1-16ndis.scad>
use <../../p/1-4chrd.scad>
use <../../p/1-4ndis.scad>
use <../../p/3-16chrd.scad>
use <../../p/3-16ndis.scad>
function ldraw_lib__s__6142622ms03() = [
// 0 ~Sticker  1.9 x  0.8 with Black Headlamp on Yellow Face Right - Upper Section 4
// 0 Name: s\6142622ms03.dat
// 0 Author: Massimo Maso [Sirio]
// 0 !LDRAW_ORG Subpart UPDATE 2022-03
// 0 !LICENSE Licensed under CC BY 2.0 and CC BY 4.0 : see CAreadme.txt
// 
// 0 BFC CERTIFY CCW
  [0,"BFC","CERTIFY"],
  [0,"BFC","CCW"],
// 
// 0 !HISTORY 2022-05-07 [PTadmin] Official Update 2022-03
// 
// 
// 0 // Primitives
// 1 0 -5.45 -.25 -4.1572 -.7 0 0 0 1 0 0 0 .7 1-4ndis.dat
  [1,0,-5.45,-.25,-4.1572,-.7,0,0,0,1,0,0,0,.7, ldraw_lib__1_4ndis()],
// 1 7 -5.45 -.25 -4.1572 -.7 0 0 0 1 0 0 0 .7 1-4chrd.dat
  [1,7,-5.45,-.25,-4.1572,-.7,0,0,0,1,0,0,0,.7, ldraw_lib__1_4chrd()],
// 1 7 -4.35 -.25 -4.1572 .7 0 0 0 1 0 0 0 .7 1-4chrd.dat
  [1,7,-4.35,-.25,-4.1572,.7,0,0,0,1,0,0,0,.7, ldraw_lib__1_4chrd()],
// 1 0 -4.35 -.25 -4.1572 .7 0 0 0 1 0 0 0 .7 1-4ndis.dat
  [1,0,-4.35,-.25,-4.1572,.7,0,0,0,1,0,0,0,.7, ldraw_lib__1_4ndis()],
// 1 7 -.675 -.25 -8 0 0 .75 0 1 0 .75 0 0 1-16chrd.dat
  [1,7,-.675,-.25,-8,0,0,.75,0,1,0,.75,0,0, ldraw_lib__1_16chrd()],
// 1 0 -.675 -.25 -7.2572 0 0 .75 0 1 0 .75 0 0 1-16ndis.dat
  [1,0,-.675,-.25,-7.2572,0,0,.75,0,1,0,.75,0,0, ldraw_lib__1_16ndis()],
// 1 7 -.675 -.25 -7.2572 0 0 -.75 0 1 0 .75 0 0 3-16chrd.dat
  [1,7,-.675,-.25,-7.2572,0,0,-.75,0,1,0,.75,0,0, ldraw_lib__3_16chrd()],
// 1 0 -.675 -.25 -7.2572 0 0 -.75 0 1 0 .75 0 0 3-16ndis.dat
  [1,0,-.675,-.25,-7.2572,0,0,-.75,0,1,0,.75,0,0, ldraw_lib__3_16ndis()],
// 0 // Yellow faces
// 3 14 8 -.25 .0128 .5491 -.25 .0128 2 -.25 -1.5072
  [3,14,8,-.25,.0128,.5491,-.25,.0128,2,-.25,-1.5072],
// 4 14 8 -.25 .0128 2 -.25 -1.5072 2.6526 -.25 -7.061 8 -.25 -7.061
  [4,14,8,-.25,.0128,2,-.25,-1.5072,2.6526,-.25,-7.061,8,-.25,-7.061],
// 0 // Black faces
// 3 0 -8 -.25 .0128 -6.15 -.25 -3.4572 -5.45 -.25 -3.4572
  [3,0,-8,-.25,.0128,-6.15,-.25,-3.4572,-5.45,-.25,-3.4572],
// 4 0 -8 -.25 .0128 -5.45 -.25 -3.4572 -4.35 -.25 -3.4572 .5491 -.25 .0128
  [4,0,-8,-.25,.0128,-5.45,-.25,-3.4572,-4.35,-.25,-3.4572,.5491,-.25,.0128],
// 3 0 .5491 -.25 .0128 -4.35 -.25 -3.4572 -3.65 -.25 -3.4572
  [3,0,.5491,-.25,.0128,-4.35,-.25,-3.4572,-3.65,-.25,-3.4572],
// 4 0 .5491 -.25 .0128 -3.65 -.25 -3.4572 -3.65 -.25 -4.1572 2 -.25 -1.5072
  [4,0,.5491,-.25,.0128,-3.65,-.25,-3.4572,-3.65,-.25,-4.1572,2,-.25,-1.5072],
// 4 0 2 -.25 -1.5072 -3.65 -.25 -4.1572 -.675 -.25 -6.5072 .075 -.25 -6.5072
  [4,0,2,-.25,-1.5072,-3.65,-.25,-4.1572,-.675,-.25,-6.5072,.075,-.25,-6.5072],
// 4 0 2 -.25 -1.5072 .075 -.25 -6.5072 .7503 -.25 -7.061 2.6526 -.25 -7.061
  [4,0,2,-.25,-1.5072,.075,-.25,-6.5072,.7503,-.25,-7.061,2.6526,-.25,-7.061],
// 4 0 -8 -.25 -7.061 -6.15 -.25 -4.1572 -6.15 -.25 -3.4572 -8 -.25 .0128
  [4,0,-8,-.25,-7.061,-6.15,-.25,-4.1572,-6.15,-.25,-3.4572,-8,-.25,.0128],
// 3 0 -8 -.25 -7.061 -6.15 -.25 -4.8572 -6.15 -.25 -4.1572
  [3,0,-8,-.25,-7.061,-6.15,-.25,-4.8572,-6.15,-.25,-4.1572],
// 4 0 -8 -.25 -7.061 -1.3987 -.25 -7.061 -3.65 -.25 -4.8572 -6.15 -.25 -4.8572
  [4,0,-8,-.25,-7.061,-1.3987,-.25,-7.061,-3.65,-.25,-4.8572,-6.15,-.25,-4.8572],
// 4 0 -3.65 -.25 -4.8572 -1.3987 -.25 -7.061 -1.367925 -.25 -6.970175 -1.425 -.25 -6.5072
  [4,0,-3.65,-.25,-4.8572,-1.3987,-.25,-7.061,-1.367925,-.25,-6.970175,-1.425,-.25,-6.5072],
// 4 0 -3.65 -.25 -4.8572 -1.425 -.25 -6.5072 -.675 -.25 -6.5072 -3.65 -.25 -4.1572
  [4,0,-3.65,-.25,-4.8572,-1.425,-.25,-6.5072,-.675,-.25,-6.5072,-3.65,-.25,-4.1572],
// 3 0 .7503 -.25 -7.061 .075 -.25 -6.5072 -.387975 -.25 -6.564275
  [3,0,.7503,-.25,-7.061,.075,-.25,-6.5072,-.387975,-.25,-6.564275],
// 0 // Light grey faces
// 4 7 -6.15 -.25 -4.1572 -3.65 -.25 -4.1572 -4.35 -.25 -3.4572 -5.45 -.25 -3.4572
  [4,7,-6.15,-.25,-4.1572,-3.65,-.25,-4.1572,-4.35,-.25,-3.4572,-5.45,-.25,-3.4572],
// 4 7 -6.15 -.25 -4.1572 -6.15 -.25 -4.8572 -3.65 -.25 -4.8572 -3.65 -.25 -4.1572
  [4,7,-6.15,-.25,-4.1572,-6.15,-.25,-4.8572,-3.65,-.25,-4.8572,-3.65,-.25,-4.1572],
// 4 7 -1.3987 -.25 -7.061 -.387975 -.25 -6.564275 -.675 -.25 -6.5072 -1.367925 -.25 -6.970175
  [4,7,-1.3987,-.25,-7.061,-.387975,-.25,-6.564275,-.675,-.25,-6.5072,-1.367925,-.25,-6.970175],
// 3 7 -1.3987 -.25 -7.061 .7503 -.25 -7.061 -.387975 -.25 -6.564275
  [3,7,-1.3987,-.25,-7.061,.7503,-.25,-7.061,-.387975,-.25,-6.564275],
];
makepoly(ldraw_lib__s__6142622ms03(), line=0.2);
// file: s/6142622ms02.scad
use <../../lib.scad>
use <../../p/1-4chrd.scad>
use <../../p/1-4ndis.scad>
function ldraw_lib__s__6142622ms02() = [
// 0 ~Sticker  1.9 x  0.8 with Black Headlamp on Yellow Face Right - Upper Section 3
// 0 Name: s\6142622ms02.dat
// 0 Author: Massimo Maso [Sirio]
// 0 !LDRAW_ORG Subpart UPDATE 2022-03
// 0 !LICENSE Licensed under CC BY 2.0 and CC BY 4.0 : see CAreadme.txt
// 
// 0 BFC CERTIFY CCW
  [0,"BFC","CERTIFY"],
  [0,"BFC","CCW"],
// 
// 0 !HISTORY 2022-05-07 [PTadmin] Official Update 2022-03
// 
// 
// 0 // Primitives
// 1 0 -5.45 -.25 .7172 -.7 0 0 0 1 0 0 0 .7 1-4ndis.dat
  [1,0,-5.45,-.25,.7172,-.7,0,0,0,1,0,0,0,.7, ldraw_lib__1_4ndis()],
// 1 7 -5.45 -.25 .7172 -.7 0 0 0 1 0 0 0 .7 1-4chrd.dat
  [1,7,-5.45,-.25,.7172,-.7,0,0,0,1,0,0,0,.7, ldraw_lib__1_4chrd()],
// 1 7 -4.35 -.25 .7172 .7 0 0 0 1 0 0 0 .7 1-4chrd.dat
  [1,7,-4.35,-.25,.7172,.7,0,0,0,1,0,0,0,.7, ldraw_lib__1_4chrd()],
// 1 0 -4.35 -.25 .7172 .7 0 0 0 1 0 0 0 .7 1-4ndis.dat
  [1,0,-4.35,-.25,.7172,.7,0,0,0,1,0,0,0,.7, ldraw_lib__1_4ndis()],
// 0 // Yellow faces
// 4 14 8 -.25 7.2284 -8 -.25 7.2284 -8 -.25 3.9672 -3.25 -.25 3.9672
  [4,14,8,-.25,7.2284,-8,-.25,7.2284,-8,-.25,3.9672,-3.25,-.25,3.9672],
// 4 14 8 -.25 7.2284 -3.25 -.25 3.9672 .5491 -.25 -.0128 8 -.25 -.0128
  [4,14,8,-.25,7.2284,-3.25,-.25,3.9672,.5491,-.25,-.0128,8,-.25,-.0128],
// 0 // Black faces
// 4 0 -8 -.25 3.9672 -8 -.25 -.0128 -6.15 -.25 .0172 -6.15 -.25 .7172
  [4,0,-8,-.25,3.9672,-8,-.25,-.0128,-6.15,-.25,.0172,-6.15,-.25,.7172],
// 3 0 -8 -.25 3.9672 -6.15 -.25 .7172 -6.15 -.25 1.4172
  [3,0,-8,-.25,3.9672,-6.15,-.25,.7172,-6.15,-.25,1.4172],
// 3 0 -8 -.25 3.9672 -6.15 -.25 1.4172 -5.45 -.25 1.4172
  [3,0,-8,-.25,3.9672,-6.15,-.25,1.4172,-5.45,-.25,1.4172],
// 4 0 -8 -.25 3.9672 -5.45 -.25 1.4172 -4.35 -.25 1.4172 -3.25 -.25 3.9672
  [4,0,-8,-.25,3.9672,-5.45,-.25,1.4172,-4.35,-.25,1.4172,-3.25,-.25,3.9672],
// 3 0 -3.25 -.25 3.9672 -4.35 -.25 1.4172 -3.65 -.25 1.4172
  [3,0,-3.25,-.25,3.9672,-4.35,-.25,1.4172,-3.65,-.25,1.4172],
// 4 0 .5491 -.25 -.0128 -3.25 -.25 3.9672 -3.65 -.25 1.4172 -3.65 -.25 .7172
  [4,0,.5491,-.25,-.0128,-3.25,-.25,3.9672,-3.65,-.25,1.4172,-3.65,-.25,.7172],
// 3 0 .5491 -.25 -.0128 -3.65 -.25 .7172 -3.65 -.25 .0172
  [3,0,.5491,-.25,-.0128,-3.65,-.25,.7172,-3.65,-.25,.0172],
// 4 0 .5491 -.25 -.0128 -3.65 -.25 .0172 -6.15 -.25 .0172 -8 -.25 -.0128
  [4,0,.5491,-.25,-.0128,-3.65,-.25,.0172,-6.15,-.25,.0172,-8,-.25,-.0128],
// 0 // Light grey faces
// 4 7 -6.15 -.25 .7172 -3.65 -.25 .7172 -4.35 -.25 1.4172 -5.45 -.25 1.4172
  [4,7,-6.15,-.25,.7172,-3.65,-.25,.7172,-4.35,-.25,1.4172,-5.45,-.25,1.4172],
// 4 7 -6.15 -.25 .7172 -6.15 -.25 .0172 -3.65 -.25 .0172 -3.65 -.25 .7172
  [4,7,-6.15,-.25,.7172,-6.15,-.25,.0172,-3.65,-.25,.0172,-3.65,-.25,.7172],
];
makepoly(ldraw_lib__s__6142622ms02(), line=0.2);
// file: s/6142622ms01.scad
use <../../lib.scad>
use <../../p/1-4chrd.scad>
function ldraw_lib__s__6142622ms01() = [
// 0 ~Sticker  1.9 x  0.8 with Black Headlamp on Yellow Background Right - Upper Section 1
// 0 Name: s\6142622ms01.dat
// 0 Author: Massimo Maso [Sirio]
// 0 !LDRAW_ORG Subpart UPDATE 2022-03
// 0 !LICENSE Licensed under CC BY 2.0 and CC BY 4.0 : see CAreadme.txt
// 
// 0 BFC CERTIFY CCW
  [0,"BFC","CERTIFY"],
  [0,"BFC","CCW"],
// 
// 0 !HISTORY 2022-05-07 [PTadmin] Official Update 2022-03
// 
// 
// 0 // Primitives
// 
// 1 14 -6.5 -.25 3.8922 -1.5 0 0 0 1 0 0 0 1.5 1-4chrd.dat
  [1,14,-6.5,-.25,3.8922,-1.5,0,0,0,1,0,0,0,1.5, ldraw_lib__1_4chrd()],
// 1 14 6.5 -.25 3.8922 1.5 0 0 0 1 0 0 0 1.5 1-4chrd.dat
  [1,14,6.5,-.25,3.8922,1.5,0,0,0,1,0,0,0,1.5, ldraw_lib__1_4chrd()],
// 0 // Faces
// 4 14 8 -.25 3.8922 6.5 -.25 5.3922 -6.5 -.25 5.3922 -8 -.25 3.8922
  [4,14,8,-.25,3.8922,6.5,-.25,5.3922,-6.5,-.25,5.3922,-8,-.25,3.8922],
// 4 14 -8 -.25 3.8922 -8 -.25 -.0121 8 -.25 -.0121 8 -.25 3.8922
  [4,14,-8,-.25,3.8922,-8,-.25,-.0121,8,-.25,-.0121,8,-.25,3.8922],
];
makepoly(ldraw_lib__s__6142622ms01(), line=0.2);
// file: 6142622m.scad
use <../lib.scad>
use <s/6142622ms01.scad>
use <s/6142622ms02.scad>
use <s/6142622ms03.scad>
use <s/6142622ms04.scad>
use <s/6142622ms05.scad>
use <s/6142622ms06.scad>
function ldraw_lib__6142622m() = [
// 0 Sticker  1.9 x  0.8 with Black Headlamp on Yellow Background Right
// 0 Name: 6142622m.dat
// 0 Author: Massimo Maso [Sirio]
// 0 !LDRAW_ORG Part UPDATE 2022-03
// 0 !LICENSE Licensed under CC BY 2.0 and CC BY 4.0 : see CAreadme.txt
// 
// 0 BFC CERTIFY CCW
  [0,"BFC","CERTIFY"],
  [0,"BFC","CCW"],
// 
// 0 !KEYWORDS Chevrolet, Corvette, Set 75870, Speed Champions
// 
// 0 !HISTORY 2022-05-07 [PTadmin] Official Update 2022-03
// 
// 
// 1 16 0 0 13.8789 1 0 0 0 1 0 0 0 1 s\6142622ms01.dat
  [1,16,0,0,13.8789,1,0,0,0,1,0,0,0,1, ldraw_lib__s__6142622ms01()],
// 4 14 -8 -.25 13.8668 -8 -.25 6.5112 8 -.25 6.5112 8 -.25 13.8668
  [4,14,-8,-.25,13.8668,-8,-.25,6.5112,8,-.25,6.5112,8,-.25,13.8668],
// 1 16 0 0 -.7172 1 0 0 0 1 0 0 0 1 s\6142622ms02.dat
  [1,16,0,0,-.7172,1,0,0,0,1,0,0,0,1, ldraw_lib__s__6142622ms02()],
// 1 16 0 0 -.7428 1 0 0 0 1 0 0 0 1 s\6142622ms03.dat
  [1,16,0,0,-.7428,1,0,0,0,1,0,0,0,1, ldraw_lib__s__6142622ms03()],
// 1 16 0 0 -14.6522 1 0 0 0 1 0 0 0 1 s\6142622ms04.dat
  [1,16,0,0,-14.6522,1,0,0,0,1,0,0,0,1, ldraw_lib__s__6142622ms04()],
// 1 16 0 0 -14.681 1 0 0 0 1 0 0 0 1 s\6142622ms05.dat
  [1,16,0,0,-14.681,1,0,0,0,1,0,0,0,1, ldraw_lib__s__6142622ms05()],
// 1 16 0 0 0 1 0 0 0 1 0 0 0 1 s\6142622ms06.dat
  [1,16,0,0,0,1,0,0,0,1,0,0,0,1, ldraw_lib__s__6142622ms06()],
];
makepoly(ldraw_lib__6142622m(), line=0.2);
// main file
use <../lib.scad>
use <6142622m.scad>
function ldraw_lib__6142622n() = [
// 0 Sticker  1.9 x  0.8 with Black Headlamp on Yellow Background Left
// 0 Name: 6142622n.dat
// 0 Author: Massimo Maso [Sirio]
// 0 !LDRAW_ORG Part UPDATE 2022-03
// 0 !LICENSE Licensed under CC BY 2.0 and CC BY 4.0 : see CAreadme.txt
// 
// 0 BFC CERTIFY CCW
  [0,"BFC","CERTIFY"],
  [0,"BFC","CCW"],
// 
// 0 !KEYWORDS Chevrolet, Corvette, Set 75870, Speed Champions
// 
// 0 !HISTORY 2022-05-07 [PTadmin] Official Update 2022-03
// 
// 
// 1 16 0 0 0 -1 0 0 0 1 0 0 0 1 6142622m.dat
  [1,16,0,0,0,-1,0,0,0,1,0,0,0,1, ldraw_lib__6142622m()],
];
makepoly(ldraw_lib__6142622n(), line=0.2);
